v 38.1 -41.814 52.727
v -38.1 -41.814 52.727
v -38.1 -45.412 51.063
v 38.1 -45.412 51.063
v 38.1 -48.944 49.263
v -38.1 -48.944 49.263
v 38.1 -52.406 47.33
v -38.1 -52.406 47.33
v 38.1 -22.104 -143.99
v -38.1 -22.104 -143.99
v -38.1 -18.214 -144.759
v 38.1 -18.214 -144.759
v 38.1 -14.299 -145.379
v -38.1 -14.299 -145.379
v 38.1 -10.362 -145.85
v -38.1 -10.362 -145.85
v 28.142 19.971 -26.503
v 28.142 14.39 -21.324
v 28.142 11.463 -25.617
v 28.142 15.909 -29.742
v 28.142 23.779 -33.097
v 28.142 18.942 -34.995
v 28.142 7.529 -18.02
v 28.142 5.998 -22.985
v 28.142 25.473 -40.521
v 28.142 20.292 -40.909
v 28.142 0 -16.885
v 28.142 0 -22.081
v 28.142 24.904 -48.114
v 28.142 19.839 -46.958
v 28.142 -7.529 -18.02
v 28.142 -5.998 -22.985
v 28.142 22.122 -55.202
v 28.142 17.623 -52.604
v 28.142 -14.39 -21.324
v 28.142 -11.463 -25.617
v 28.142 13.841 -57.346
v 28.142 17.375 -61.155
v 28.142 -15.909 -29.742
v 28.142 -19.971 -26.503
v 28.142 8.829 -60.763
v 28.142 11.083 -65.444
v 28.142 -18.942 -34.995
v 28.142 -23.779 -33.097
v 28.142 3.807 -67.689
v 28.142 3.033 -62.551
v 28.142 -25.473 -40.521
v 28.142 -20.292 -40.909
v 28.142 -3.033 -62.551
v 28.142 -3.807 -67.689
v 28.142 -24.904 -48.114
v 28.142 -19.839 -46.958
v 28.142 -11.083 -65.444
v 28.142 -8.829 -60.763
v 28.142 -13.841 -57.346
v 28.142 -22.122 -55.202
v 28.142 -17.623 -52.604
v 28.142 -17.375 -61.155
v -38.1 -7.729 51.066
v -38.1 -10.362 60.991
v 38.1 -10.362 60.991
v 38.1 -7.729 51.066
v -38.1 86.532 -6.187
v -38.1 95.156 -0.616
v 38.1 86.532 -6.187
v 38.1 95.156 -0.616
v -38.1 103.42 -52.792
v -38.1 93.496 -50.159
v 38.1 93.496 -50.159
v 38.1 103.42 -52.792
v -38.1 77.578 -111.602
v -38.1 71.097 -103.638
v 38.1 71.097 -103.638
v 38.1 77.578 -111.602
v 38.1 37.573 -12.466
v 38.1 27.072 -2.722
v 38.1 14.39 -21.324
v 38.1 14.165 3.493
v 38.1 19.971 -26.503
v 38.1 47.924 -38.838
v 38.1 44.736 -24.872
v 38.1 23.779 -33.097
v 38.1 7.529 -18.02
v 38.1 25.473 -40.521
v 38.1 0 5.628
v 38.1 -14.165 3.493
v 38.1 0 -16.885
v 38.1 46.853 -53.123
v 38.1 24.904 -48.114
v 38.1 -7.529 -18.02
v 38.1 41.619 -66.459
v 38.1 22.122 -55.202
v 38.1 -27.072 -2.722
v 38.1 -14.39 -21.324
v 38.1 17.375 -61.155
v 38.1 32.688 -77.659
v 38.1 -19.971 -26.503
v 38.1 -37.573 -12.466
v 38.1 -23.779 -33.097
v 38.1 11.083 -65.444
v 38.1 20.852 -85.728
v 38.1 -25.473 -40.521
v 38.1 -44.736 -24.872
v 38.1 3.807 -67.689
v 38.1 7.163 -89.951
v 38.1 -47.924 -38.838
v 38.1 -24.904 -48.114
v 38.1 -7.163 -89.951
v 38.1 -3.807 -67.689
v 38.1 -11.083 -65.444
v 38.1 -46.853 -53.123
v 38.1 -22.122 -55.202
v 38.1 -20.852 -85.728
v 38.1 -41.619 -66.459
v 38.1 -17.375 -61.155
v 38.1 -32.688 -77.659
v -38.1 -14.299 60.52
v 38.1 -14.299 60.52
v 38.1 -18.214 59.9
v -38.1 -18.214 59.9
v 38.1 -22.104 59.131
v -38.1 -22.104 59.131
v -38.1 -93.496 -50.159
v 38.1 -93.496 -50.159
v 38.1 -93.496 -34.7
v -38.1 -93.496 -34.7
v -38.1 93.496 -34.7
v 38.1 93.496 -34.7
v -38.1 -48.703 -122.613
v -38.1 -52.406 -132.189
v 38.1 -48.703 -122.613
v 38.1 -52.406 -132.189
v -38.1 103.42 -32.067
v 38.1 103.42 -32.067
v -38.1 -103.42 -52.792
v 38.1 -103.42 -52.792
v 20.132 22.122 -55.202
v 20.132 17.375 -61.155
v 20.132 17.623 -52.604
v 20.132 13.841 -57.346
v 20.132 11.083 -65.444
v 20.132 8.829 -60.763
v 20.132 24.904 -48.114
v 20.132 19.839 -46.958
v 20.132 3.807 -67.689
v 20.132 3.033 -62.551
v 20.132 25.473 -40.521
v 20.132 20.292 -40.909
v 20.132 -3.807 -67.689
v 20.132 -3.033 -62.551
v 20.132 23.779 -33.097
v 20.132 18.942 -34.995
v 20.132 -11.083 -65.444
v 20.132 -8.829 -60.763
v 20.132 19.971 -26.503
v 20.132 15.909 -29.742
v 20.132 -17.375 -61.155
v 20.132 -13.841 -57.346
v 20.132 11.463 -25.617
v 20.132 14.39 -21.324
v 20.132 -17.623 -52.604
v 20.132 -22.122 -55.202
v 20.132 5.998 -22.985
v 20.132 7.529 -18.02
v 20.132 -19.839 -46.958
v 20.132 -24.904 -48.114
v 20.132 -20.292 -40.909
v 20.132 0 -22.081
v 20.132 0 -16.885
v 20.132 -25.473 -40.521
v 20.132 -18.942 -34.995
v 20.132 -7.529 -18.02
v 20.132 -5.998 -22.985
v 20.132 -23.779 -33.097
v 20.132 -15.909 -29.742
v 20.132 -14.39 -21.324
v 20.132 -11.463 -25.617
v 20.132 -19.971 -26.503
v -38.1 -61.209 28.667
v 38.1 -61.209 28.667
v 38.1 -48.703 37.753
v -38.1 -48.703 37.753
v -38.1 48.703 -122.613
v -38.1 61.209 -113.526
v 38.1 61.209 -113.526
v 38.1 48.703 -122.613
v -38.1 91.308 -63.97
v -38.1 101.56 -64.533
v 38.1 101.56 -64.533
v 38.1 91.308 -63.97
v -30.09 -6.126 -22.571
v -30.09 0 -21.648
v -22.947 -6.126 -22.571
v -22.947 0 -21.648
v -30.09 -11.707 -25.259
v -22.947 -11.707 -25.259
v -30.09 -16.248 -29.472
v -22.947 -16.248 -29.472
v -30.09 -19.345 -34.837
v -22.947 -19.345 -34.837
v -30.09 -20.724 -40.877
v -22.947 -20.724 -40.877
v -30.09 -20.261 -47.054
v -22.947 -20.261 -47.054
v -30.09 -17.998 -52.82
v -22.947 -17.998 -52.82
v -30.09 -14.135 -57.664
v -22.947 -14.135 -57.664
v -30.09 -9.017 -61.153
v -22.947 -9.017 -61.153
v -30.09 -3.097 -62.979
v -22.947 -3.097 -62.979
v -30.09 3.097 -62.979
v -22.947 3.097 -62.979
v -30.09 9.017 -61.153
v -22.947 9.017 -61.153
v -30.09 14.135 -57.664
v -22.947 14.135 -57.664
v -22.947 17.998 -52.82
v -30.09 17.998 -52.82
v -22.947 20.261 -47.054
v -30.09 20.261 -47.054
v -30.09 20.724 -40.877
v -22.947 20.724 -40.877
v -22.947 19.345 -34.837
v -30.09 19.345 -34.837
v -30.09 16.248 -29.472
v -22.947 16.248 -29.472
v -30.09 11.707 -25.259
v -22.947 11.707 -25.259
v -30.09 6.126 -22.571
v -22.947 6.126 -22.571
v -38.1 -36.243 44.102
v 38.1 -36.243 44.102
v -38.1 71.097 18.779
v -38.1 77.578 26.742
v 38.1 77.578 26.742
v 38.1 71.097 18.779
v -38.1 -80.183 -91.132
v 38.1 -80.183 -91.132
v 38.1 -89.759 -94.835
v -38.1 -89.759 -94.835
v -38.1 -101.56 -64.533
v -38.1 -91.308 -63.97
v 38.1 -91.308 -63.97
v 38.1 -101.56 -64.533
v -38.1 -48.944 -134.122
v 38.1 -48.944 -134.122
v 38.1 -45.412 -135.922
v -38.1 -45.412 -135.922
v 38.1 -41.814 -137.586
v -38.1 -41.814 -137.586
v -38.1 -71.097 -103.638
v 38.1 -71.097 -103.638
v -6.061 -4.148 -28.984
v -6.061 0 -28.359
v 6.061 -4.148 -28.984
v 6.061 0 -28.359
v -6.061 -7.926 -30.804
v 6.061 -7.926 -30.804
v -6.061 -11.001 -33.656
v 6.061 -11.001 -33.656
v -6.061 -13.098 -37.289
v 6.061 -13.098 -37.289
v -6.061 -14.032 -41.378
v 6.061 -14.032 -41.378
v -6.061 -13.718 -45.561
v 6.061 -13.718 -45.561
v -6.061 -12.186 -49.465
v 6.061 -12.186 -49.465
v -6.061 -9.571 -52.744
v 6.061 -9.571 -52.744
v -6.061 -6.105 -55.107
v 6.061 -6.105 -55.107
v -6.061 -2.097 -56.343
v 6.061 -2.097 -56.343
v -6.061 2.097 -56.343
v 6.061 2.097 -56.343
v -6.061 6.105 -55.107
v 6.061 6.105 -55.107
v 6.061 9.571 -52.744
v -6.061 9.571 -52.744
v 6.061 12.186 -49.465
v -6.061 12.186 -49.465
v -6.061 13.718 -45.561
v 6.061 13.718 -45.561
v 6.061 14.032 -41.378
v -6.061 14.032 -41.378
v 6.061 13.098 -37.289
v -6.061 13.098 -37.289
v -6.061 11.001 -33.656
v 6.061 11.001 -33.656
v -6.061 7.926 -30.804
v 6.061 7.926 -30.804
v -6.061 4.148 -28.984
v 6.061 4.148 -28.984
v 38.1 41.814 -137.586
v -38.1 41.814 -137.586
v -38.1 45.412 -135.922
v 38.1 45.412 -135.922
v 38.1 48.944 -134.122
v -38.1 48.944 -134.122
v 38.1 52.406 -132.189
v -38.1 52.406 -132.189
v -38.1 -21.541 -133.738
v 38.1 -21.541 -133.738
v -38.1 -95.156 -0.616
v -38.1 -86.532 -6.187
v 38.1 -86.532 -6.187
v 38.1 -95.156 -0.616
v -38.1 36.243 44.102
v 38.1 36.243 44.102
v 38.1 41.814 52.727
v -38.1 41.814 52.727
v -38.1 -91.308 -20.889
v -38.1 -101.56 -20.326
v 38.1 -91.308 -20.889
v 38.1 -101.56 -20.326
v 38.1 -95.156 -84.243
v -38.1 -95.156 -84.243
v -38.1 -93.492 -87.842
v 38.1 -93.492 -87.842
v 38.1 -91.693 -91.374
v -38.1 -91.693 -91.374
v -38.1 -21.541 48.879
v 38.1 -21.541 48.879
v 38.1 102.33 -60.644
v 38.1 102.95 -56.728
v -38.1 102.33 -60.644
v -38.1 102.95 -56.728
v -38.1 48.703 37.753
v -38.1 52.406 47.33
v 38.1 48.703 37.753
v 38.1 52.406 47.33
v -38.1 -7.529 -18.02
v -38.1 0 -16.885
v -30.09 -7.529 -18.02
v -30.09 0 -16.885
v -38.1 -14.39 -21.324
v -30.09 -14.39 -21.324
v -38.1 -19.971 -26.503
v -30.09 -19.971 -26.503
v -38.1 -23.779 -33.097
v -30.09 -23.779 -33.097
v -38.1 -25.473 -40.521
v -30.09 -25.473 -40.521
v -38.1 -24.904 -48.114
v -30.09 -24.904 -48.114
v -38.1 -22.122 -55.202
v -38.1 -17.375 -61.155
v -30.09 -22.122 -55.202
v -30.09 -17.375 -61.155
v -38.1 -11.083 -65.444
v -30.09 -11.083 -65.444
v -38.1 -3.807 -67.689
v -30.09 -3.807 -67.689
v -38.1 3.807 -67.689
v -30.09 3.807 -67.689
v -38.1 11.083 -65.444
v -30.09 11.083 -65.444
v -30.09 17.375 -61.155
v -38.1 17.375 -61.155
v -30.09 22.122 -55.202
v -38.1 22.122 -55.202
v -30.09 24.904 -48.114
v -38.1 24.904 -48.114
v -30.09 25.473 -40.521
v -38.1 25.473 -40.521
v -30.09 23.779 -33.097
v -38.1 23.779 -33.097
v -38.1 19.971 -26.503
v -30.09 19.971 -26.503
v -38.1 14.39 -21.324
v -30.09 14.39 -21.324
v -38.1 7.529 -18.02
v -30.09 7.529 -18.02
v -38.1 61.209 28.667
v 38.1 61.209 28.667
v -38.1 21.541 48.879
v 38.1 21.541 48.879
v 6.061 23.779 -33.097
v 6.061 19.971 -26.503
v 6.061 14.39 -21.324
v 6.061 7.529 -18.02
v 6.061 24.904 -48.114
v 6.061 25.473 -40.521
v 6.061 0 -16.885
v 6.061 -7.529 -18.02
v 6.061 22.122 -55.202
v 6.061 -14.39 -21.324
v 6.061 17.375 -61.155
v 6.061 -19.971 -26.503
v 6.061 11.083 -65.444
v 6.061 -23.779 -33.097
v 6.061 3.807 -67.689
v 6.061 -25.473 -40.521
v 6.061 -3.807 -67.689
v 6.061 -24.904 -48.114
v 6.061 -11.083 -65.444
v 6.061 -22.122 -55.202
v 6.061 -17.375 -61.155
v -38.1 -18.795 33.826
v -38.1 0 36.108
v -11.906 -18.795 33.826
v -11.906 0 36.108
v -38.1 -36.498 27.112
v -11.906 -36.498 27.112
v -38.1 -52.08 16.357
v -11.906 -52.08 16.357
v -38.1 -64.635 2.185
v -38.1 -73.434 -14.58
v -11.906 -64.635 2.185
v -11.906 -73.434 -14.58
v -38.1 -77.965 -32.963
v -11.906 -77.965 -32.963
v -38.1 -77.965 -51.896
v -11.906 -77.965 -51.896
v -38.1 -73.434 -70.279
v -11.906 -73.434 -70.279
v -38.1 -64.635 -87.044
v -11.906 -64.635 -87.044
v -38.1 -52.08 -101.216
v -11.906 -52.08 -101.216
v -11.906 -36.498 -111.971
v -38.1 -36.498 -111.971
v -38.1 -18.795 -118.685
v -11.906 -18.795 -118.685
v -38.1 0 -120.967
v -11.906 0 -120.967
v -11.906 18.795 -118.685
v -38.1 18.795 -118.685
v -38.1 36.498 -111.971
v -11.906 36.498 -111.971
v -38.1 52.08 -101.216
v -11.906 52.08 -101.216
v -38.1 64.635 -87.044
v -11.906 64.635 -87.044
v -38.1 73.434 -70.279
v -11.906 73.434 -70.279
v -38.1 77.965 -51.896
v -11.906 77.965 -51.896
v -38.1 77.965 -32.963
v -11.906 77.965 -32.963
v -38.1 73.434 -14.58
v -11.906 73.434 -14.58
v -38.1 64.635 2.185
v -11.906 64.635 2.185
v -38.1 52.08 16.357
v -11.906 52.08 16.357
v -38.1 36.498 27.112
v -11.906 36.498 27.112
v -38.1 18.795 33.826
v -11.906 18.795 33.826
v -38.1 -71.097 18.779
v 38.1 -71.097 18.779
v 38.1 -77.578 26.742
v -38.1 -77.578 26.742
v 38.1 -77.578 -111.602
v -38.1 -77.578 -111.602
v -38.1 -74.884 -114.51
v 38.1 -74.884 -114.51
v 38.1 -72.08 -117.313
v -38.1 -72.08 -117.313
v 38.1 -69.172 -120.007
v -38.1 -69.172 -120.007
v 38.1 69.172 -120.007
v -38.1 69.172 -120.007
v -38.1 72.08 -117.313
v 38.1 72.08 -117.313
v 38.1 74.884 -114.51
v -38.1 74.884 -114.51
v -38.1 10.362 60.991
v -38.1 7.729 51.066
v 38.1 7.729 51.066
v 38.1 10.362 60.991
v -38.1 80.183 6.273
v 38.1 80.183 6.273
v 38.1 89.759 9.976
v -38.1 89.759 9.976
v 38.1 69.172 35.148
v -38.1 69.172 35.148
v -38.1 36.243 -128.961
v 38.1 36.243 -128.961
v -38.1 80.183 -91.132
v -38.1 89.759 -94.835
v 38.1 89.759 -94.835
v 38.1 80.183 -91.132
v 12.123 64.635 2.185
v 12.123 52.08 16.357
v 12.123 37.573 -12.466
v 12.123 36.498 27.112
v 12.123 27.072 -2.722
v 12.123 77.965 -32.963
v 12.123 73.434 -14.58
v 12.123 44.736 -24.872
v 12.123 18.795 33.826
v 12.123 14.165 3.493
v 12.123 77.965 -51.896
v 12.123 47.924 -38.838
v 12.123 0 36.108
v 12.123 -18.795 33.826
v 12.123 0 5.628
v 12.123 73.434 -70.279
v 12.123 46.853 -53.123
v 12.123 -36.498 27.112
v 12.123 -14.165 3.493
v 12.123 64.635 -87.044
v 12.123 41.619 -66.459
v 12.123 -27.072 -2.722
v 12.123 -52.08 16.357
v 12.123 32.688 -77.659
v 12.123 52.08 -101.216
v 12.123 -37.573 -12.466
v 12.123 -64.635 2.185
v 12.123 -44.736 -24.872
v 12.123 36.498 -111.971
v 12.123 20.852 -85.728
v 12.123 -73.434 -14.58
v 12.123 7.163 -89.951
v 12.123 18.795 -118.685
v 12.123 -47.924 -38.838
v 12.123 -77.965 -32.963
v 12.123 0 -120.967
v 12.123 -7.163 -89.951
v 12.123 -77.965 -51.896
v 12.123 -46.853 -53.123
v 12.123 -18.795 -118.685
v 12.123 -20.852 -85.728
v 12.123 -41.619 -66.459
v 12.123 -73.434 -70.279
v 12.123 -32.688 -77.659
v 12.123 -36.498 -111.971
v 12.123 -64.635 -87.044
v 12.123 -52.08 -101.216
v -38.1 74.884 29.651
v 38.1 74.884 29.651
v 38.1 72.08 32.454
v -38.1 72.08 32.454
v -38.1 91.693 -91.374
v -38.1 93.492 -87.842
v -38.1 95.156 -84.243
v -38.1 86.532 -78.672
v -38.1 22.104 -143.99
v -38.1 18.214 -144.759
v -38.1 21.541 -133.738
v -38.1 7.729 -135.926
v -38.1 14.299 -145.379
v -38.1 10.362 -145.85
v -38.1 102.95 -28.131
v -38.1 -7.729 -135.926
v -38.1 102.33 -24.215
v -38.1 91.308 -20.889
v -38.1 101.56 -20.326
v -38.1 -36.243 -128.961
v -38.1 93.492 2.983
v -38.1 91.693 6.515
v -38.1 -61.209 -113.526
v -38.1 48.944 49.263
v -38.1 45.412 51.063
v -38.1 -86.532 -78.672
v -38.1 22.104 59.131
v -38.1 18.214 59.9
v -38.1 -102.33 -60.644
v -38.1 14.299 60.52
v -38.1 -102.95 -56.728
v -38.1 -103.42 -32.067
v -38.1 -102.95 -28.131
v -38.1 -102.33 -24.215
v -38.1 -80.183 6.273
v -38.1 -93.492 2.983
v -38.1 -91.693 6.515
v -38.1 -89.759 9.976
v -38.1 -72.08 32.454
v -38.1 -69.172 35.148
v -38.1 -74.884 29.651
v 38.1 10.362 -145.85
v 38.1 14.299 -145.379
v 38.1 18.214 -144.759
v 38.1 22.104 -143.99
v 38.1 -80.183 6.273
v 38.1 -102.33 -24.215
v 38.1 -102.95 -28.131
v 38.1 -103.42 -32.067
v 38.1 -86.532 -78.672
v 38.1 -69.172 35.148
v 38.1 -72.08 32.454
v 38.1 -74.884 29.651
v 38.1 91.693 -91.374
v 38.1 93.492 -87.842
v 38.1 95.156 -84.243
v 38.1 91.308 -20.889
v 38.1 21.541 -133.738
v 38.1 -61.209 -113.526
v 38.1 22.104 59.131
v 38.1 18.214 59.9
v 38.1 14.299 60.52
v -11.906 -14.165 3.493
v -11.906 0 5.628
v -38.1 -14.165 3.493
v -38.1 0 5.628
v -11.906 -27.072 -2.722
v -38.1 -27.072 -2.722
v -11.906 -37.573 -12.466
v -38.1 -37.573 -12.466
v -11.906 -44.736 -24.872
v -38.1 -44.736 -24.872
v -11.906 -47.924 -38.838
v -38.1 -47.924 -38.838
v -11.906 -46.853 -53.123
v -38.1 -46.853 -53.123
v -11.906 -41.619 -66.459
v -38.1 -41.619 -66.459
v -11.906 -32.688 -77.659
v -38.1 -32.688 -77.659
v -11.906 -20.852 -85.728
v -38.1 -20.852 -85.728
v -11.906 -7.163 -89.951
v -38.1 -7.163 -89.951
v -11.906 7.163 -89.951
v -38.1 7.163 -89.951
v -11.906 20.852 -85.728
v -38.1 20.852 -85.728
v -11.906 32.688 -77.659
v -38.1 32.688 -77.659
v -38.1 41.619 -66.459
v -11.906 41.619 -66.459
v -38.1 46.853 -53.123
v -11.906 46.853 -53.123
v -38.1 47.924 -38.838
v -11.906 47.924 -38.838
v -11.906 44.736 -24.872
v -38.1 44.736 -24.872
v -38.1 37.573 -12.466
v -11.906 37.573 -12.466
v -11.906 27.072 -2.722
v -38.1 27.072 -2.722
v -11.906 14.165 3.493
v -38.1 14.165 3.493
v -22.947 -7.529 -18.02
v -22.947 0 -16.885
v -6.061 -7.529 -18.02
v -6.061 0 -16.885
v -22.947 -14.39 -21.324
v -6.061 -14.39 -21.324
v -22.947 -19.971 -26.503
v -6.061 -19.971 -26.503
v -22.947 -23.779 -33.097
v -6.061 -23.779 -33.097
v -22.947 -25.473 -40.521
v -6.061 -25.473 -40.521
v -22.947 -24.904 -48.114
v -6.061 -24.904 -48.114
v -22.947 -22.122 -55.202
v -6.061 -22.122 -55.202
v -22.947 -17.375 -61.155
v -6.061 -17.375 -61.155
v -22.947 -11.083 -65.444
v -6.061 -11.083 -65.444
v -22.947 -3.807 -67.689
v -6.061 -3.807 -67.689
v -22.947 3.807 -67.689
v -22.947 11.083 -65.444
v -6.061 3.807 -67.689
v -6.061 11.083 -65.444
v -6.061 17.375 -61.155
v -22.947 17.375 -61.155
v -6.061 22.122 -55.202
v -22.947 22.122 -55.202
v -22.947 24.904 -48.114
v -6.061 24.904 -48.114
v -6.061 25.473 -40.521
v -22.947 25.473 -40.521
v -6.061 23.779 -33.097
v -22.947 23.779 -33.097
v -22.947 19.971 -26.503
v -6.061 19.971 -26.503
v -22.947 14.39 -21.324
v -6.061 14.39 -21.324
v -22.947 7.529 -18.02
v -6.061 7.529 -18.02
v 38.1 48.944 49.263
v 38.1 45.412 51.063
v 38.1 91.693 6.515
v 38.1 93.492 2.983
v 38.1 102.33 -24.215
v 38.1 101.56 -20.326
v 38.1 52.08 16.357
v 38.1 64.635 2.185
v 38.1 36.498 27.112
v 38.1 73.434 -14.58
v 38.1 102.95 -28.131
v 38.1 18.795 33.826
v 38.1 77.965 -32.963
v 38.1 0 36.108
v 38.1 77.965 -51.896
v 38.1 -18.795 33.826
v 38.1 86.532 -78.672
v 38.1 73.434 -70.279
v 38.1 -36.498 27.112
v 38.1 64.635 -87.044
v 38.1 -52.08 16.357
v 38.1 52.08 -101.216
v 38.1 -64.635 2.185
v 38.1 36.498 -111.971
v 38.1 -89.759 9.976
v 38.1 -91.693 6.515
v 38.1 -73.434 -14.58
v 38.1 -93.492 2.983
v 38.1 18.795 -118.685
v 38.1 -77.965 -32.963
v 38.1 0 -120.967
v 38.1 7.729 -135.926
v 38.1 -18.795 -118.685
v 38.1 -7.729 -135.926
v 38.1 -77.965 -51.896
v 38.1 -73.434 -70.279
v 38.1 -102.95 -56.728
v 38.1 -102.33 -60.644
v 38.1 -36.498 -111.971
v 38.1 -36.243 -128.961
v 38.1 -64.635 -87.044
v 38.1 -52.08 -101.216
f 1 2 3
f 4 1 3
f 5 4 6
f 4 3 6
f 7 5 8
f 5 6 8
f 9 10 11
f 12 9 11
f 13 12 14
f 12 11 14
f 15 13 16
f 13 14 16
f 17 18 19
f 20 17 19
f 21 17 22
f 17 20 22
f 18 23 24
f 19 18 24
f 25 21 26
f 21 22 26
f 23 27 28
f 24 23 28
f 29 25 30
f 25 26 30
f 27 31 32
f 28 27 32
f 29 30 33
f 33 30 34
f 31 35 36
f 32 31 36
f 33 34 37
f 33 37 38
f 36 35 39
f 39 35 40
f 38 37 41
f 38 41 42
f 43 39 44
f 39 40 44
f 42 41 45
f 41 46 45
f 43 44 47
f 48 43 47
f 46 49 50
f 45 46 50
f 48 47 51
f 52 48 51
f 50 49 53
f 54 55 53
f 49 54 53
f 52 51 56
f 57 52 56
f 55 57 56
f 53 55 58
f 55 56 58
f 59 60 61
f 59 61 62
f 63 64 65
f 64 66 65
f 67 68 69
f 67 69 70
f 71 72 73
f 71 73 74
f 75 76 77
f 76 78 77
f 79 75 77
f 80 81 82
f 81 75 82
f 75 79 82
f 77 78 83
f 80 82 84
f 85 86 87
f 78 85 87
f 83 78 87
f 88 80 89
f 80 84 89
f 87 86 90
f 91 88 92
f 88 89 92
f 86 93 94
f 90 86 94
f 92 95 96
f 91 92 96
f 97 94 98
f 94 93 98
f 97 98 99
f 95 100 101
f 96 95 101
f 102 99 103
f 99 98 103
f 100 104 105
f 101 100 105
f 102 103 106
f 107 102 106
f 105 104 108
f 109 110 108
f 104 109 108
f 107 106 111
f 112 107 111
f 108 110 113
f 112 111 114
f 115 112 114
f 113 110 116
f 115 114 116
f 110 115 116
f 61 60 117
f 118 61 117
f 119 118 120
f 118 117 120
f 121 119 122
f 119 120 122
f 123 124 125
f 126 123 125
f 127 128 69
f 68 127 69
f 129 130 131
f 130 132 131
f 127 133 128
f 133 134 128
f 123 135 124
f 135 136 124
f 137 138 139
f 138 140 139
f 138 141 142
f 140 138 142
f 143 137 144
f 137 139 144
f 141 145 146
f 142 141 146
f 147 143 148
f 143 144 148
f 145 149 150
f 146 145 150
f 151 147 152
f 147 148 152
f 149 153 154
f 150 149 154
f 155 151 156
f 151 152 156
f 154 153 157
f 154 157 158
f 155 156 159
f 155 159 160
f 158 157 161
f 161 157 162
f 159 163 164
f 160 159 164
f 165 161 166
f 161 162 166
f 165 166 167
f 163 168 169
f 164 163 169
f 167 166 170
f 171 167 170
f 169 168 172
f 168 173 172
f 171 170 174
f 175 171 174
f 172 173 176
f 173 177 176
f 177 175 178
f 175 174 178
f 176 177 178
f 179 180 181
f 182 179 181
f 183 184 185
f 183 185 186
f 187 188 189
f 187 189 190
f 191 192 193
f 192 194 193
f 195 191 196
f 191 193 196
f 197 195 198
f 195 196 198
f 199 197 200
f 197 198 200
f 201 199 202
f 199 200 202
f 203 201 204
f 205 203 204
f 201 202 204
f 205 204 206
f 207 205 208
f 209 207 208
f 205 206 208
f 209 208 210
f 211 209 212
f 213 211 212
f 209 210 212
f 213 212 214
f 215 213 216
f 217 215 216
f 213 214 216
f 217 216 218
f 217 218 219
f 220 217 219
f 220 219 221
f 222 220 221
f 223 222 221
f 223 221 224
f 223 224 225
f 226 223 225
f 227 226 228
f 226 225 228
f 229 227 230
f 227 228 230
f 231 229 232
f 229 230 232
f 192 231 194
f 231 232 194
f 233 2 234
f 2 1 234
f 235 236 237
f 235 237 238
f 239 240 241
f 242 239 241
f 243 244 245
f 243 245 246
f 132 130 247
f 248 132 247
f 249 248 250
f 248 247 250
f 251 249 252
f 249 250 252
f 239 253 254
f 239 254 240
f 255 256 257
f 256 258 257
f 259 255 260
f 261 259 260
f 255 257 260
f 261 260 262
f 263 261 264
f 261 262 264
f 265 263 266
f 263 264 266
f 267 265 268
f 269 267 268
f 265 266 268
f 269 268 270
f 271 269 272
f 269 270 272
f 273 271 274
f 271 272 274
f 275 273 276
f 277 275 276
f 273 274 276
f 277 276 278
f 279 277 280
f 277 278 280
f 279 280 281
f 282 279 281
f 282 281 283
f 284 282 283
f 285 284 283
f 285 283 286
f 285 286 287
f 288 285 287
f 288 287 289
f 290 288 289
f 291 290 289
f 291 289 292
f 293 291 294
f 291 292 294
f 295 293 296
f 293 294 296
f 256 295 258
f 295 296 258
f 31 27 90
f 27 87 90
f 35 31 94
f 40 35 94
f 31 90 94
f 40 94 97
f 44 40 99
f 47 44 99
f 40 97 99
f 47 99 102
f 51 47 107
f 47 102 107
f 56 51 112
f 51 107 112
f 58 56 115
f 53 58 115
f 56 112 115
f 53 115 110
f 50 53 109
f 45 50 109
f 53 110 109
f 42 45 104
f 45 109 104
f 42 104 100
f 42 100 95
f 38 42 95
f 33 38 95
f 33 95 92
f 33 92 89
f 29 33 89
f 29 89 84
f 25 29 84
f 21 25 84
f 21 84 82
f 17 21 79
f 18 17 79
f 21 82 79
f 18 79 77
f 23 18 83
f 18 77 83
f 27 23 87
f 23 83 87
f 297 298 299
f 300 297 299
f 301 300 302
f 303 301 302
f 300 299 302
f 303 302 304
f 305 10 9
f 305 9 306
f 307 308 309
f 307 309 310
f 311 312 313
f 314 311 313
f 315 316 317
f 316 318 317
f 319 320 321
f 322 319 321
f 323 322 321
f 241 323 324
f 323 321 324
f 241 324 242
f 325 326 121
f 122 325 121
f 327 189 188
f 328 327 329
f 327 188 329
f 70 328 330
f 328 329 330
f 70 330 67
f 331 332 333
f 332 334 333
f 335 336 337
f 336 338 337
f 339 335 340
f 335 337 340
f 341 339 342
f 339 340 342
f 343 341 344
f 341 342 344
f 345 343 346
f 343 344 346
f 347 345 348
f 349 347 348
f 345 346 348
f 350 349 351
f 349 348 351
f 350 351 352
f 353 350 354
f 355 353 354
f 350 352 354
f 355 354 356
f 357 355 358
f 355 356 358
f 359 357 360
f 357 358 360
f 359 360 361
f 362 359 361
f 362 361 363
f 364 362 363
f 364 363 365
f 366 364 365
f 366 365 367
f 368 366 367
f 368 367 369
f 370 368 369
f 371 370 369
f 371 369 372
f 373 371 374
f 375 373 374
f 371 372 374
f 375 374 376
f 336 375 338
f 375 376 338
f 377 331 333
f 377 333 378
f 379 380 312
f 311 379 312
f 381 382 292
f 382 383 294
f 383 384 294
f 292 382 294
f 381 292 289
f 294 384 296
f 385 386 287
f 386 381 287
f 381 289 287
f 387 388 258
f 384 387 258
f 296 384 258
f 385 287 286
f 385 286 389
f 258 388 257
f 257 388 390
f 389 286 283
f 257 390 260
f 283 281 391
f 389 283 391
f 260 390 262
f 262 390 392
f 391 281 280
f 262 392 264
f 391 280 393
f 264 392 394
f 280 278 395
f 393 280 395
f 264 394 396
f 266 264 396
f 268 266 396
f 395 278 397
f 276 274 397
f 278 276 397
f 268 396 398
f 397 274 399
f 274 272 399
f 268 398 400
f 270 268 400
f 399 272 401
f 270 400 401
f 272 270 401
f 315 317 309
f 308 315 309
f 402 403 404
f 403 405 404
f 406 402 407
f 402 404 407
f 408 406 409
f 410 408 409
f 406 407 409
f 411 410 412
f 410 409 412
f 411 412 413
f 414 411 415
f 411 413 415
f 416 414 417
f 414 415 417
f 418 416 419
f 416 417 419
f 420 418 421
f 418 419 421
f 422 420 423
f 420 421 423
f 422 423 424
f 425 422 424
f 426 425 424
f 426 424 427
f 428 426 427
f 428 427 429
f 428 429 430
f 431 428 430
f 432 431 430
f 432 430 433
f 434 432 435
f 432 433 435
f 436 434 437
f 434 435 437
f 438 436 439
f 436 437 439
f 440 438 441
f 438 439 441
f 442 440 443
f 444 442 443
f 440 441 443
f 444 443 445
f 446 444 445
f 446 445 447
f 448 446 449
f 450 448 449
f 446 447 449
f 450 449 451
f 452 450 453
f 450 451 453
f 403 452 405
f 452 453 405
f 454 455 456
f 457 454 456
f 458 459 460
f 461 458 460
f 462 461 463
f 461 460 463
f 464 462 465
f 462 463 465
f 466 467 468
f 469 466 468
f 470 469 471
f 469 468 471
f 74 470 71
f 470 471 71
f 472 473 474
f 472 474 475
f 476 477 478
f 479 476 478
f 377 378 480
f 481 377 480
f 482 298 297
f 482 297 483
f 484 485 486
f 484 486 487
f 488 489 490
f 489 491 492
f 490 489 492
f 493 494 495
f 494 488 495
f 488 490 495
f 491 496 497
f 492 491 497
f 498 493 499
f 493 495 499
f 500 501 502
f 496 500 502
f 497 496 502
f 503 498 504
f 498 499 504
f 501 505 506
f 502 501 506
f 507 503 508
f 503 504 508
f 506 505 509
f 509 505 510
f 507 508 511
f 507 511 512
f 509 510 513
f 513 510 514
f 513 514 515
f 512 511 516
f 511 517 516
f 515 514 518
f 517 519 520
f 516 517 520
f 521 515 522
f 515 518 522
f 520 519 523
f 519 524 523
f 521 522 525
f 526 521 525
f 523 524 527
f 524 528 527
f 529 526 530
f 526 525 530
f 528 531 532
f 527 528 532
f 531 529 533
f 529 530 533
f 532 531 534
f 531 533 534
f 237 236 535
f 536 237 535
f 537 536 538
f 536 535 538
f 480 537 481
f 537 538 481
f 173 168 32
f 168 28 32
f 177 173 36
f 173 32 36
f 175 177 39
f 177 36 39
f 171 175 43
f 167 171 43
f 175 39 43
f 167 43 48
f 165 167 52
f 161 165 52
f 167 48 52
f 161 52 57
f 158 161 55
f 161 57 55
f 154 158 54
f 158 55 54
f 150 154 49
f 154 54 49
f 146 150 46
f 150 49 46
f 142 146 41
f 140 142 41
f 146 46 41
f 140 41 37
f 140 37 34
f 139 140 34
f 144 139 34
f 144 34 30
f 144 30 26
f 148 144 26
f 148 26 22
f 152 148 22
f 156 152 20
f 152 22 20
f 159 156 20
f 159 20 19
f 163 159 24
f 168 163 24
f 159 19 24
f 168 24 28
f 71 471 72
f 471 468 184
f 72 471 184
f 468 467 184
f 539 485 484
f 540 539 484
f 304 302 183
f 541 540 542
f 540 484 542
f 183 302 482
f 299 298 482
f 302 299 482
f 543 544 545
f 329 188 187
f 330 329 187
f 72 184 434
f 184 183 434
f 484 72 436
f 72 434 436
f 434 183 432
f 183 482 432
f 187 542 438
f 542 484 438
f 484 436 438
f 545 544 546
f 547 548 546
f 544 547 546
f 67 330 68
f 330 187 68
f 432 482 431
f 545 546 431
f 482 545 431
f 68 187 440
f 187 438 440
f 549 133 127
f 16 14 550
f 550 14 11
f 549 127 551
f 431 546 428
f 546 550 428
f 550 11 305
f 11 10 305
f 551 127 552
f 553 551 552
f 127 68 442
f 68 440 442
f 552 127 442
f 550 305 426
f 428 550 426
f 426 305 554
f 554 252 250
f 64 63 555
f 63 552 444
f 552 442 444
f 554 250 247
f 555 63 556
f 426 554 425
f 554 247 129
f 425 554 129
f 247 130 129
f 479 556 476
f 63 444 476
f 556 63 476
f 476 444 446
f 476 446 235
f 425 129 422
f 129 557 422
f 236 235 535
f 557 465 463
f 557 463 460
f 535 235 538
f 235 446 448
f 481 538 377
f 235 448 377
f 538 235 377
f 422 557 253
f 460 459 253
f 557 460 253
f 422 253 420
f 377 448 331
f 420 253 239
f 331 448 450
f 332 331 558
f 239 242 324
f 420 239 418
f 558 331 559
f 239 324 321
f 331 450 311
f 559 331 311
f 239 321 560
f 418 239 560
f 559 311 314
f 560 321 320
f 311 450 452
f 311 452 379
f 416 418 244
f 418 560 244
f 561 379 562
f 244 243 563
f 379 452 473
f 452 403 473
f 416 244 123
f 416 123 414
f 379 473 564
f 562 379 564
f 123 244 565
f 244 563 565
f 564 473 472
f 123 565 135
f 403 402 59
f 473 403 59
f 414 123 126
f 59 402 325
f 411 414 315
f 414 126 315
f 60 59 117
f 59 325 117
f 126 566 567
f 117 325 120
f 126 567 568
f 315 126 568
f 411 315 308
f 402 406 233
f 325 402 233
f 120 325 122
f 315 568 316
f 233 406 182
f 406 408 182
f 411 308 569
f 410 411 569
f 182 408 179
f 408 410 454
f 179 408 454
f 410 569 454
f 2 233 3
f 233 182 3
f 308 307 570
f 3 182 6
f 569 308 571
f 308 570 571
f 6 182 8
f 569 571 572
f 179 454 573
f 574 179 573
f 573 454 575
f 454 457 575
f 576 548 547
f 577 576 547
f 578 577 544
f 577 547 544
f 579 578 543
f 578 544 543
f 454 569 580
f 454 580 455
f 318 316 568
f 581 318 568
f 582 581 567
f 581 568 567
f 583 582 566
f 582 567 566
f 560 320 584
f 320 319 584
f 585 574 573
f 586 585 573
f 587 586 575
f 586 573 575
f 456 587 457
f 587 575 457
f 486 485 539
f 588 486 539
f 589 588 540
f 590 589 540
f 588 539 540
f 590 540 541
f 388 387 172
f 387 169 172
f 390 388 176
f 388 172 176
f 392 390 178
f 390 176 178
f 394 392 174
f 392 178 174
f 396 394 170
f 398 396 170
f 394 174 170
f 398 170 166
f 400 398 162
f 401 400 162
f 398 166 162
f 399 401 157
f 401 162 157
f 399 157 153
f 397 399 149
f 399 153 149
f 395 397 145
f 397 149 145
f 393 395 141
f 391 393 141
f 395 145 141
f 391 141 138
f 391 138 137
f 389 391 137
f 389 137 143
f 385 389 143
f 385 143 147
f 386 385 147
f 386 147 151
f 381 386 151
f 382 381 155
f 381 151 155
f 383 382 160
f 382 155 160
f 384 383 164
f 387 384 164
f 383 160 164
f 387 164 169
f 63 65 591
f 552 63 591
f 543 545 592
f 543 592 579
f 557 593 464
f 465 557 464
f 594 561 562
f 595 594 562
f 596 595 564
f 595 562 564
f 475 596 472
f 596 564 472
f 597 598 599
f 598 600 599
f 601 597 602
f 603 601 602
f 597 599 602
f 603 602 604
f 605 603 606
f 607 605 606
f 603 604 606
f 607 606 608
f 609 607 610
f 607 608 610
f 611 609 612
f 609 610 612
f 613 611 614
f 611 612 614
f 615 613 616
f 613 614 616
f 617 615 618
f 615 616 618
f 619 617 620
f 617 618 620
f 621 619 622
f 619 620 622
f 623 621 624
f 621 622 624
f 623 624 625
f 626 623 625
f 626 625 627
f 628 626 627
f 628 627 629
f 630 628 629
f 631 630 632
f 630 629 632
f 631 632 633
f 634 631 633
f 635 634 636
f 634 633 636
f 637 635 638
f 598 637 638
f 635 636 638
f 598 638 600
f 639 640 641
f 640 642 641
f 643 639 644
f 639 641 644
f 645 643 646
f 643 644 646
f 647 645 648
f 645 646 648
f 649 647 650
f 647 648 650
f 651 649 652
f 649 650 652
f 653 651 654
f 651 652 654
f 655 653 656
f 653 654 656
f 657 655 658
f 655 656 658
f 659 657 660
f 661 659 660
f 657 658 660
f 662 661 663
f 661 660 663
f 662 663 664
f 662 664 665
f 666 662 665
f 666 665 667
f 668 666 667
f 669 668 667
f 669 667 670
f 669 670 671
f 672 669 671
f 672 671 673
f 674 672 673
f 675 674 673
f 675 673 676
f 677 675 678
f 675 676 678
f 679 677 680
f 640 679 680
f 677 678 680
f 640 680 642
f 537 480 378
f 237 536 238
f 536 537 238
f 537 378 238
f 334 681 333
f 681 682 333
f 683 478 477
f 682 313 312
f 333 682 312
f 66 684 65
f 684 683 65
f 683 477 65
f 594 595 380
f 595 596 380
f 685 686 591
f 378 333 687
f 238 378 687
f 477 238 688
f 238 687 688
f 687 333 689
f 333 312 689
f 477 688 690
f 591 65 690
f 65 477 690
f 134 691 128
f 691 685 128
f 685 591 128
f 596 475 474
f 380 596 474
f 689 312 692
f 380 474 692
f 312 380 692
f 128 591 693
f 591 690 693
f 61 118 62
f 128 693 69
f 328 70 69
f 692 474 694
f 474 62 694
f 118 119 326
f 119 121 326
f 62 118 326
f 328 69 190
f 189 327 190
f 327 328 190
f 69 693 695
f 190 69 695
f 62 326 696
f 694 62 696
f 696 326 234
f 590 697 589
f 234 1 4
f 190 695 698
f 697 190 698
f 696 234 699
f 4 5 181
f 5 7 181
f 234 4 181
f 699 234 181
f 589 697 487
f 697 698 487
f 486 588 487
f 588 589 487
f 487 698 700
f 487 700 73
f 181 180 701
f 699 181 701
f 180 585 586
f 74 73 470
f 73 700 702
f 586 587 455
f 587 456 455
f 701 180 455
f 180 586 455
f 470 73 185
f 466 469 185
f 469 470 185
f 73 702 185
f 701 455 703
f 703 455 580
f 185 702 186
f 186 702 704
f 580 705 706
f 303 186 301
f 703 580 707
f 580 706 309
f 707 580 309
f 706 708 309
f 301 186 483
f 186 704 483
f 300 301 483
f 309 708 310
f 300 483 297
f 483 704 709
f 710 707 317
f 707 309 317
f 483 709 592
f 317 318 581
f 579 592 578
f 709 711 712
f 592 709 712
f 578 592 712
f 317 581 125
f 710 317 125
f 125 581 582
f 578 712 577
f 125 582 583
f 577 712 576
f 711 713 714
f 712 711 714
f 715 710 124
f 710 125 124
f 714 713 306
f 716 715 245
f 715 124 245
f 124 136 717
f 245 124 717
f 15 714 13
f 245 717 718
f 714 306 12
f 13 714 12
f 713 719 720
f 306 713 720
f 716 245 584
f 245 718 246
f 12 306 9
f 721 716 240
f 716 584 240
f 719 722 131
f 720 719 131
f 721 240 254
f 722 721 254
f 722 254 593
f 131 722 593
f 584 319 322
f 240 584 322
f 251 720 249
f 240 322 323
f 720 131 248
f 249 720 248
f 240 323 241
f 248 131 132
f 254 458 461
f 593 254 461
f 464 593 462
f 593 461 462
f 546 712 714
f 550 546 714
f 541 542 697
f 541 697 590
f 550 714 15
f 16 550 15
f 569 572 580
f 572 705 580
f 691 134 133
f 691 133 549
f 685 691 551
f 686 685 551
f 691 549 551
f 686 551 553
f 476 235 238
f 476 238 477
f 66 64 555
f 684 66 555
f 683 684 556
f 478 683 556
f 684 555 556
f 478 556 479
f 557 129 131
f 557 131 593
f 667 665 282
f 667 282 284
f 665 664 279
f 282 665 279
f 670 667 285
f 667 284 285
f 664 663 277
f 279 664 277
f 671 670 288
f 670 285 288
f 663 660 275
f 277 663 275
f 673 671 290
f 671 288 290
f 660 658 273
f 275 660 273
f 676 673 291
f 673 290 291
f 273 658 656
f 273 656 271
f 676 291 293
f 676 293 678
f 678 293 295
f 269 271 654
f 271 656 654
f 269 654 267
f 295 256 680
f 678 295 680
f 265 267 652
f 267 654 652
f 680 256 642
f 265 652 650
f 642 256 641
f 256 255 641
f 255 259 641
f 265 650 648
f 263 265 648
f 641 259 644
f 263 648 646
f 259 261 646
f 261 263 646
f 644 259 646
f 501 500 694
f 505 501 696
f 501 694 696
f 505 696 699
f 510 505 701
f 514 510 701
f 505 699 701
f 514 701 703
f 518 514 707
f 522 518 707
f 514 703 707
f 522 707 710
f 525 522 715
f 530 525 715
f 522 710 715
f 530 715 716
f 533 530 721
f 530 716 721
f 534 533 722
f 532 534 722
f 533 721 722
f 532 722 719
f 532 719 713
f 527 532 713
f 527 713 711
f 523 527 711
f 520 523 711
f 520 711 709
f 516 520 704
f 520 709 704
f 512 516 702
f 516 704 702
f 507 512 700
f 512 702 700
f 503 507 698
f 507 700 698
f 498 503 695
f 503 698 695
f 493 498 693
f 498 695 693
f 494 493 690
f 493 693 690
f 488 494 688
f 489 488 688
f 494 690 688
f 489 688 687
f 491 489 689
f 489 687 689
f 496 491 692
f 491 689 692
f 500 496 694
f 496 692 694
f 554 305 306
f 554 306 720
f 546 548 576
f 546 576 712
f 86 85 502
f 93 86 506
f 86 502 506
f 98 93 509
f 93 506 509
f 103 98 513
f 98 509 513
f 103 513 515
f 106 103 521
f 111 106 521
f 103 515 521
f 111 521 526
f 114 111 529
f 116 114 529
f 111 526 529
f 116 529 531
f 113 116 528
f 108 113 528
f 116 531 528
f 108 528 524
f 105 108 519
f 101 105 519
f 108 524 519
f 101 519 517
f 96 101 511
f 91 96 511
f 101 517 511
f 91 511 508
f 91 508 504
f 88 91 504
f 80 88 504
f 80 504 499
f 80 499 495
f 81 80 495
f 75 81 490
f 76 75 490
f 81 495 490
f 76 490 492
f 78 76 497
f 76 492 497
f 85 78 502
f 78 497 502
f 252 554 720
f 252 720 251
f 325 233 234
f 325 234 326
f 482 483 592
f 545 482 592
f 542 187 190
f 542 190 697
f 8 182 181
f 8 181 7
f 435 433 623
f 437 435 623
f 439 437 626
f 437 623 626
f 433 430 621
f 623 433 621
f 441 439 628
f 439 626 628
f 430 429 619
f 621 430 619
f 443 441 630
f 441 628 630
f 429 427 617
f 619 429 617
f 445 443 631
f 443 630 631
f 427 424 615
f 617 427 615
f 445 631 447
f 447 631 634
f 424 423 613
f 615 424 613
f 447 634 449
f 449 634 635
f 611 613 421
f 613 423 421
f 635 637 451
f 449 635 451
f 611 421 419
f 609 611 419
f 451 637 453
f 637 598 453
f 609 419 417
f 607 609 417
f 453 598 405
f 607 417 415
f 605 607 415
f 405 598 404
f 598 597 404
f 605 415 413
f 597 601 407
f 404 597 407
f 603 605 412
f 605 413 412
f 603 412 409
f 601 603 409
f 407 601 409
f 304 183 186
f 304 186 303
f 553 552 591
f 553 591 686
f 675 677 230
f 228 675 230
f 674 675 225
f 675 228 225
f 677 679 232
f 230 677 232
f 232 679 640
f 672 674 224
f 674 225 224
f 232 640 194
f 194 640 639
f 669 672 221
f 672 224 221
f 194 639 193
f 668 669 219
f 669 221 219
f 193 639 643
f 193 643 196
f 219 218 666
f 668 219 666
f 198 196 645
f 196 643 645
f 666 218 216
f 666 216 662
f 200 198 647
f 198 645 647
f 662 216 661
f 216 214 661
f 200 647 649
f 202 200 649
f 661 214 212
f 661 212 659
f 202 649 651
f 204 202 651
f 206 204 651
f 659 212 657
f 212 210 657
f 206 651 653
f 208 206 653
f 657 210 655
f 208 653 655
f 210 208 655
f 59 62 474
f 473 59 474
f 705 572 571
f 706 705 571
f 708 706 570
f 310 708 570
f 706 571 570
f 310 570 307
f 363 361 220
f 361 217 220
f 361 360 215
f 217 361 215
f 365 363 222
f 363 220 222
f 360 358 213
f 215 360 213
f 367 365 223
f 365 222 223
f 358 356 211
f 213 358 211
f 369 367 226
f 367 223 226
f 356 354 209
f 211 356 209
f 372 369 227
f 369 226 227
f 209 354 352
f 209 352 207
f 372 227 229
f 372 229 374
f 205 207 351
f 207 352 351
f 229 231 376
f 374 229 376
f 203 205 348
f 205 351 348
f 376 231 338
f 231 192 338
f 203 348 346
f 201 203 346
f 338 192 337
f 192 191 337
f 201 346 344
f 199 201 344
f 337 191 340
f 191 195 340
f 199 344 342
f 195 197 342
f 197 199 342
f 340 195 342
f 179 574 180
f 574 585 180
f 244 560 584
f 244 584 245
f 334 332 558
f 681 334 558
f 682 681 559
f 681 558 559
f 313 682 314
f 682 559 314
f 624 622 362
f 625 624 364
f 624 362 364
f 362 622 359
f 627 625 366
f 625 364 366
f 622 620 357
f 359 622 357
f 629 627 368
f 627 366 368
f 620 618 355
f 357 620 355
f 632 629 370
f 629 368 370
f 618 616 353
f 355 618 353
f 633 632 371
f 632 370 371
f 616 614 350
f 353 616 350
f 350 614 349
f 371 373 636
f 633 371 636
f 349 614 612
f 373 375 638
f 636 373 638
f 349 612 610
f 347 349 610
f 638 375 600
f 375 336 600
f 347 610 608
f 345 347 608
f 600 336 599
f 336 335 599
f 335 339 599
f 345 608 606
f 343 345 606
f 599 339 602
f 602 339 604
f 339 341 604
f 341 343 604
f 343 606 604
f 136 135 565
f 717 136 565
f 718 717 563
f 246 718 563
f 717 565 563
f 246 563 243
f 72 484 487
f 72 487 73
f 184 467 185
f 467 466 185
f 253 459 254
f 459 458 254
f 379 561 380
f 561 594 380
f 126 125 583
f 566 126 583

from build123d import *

# Parameters (mm, degrees)
F3_DEPTH        = 88.646
F3_COPIES_COUNT = 20


# Not quite as in the source:
# - a feature of the source that left no trace in its solid (it failed there, or was rolled back) is left out
# - a pattern or mirror of a feature is missing from the dataset's text; its kind, count and spacing are read off the source's solid


with BuildPart() as f1:
    # F0 (on Front) → F1 (revolve)
    with BuildSketch(Plane.XZ):
        Polygon((38.1, 36.1084090909), (38.1, 61.5084090909), (-38.1, 61.5084090909), (-38.1, 36.1084090909), (-11.9062505468, 36.1084090909), (-11.9062505468, 5.6284090909), (-38.1, 5.6284090909), (-38.1, -16.8852278195), (-30.0903403623, -16.8852278195), (-30.0903403623, -21.6477272727), (-22.9465920027, -21.6477272727), (-22.9465920027, -16.8852278195), (-6.0613630896, -16.8852278195), (-6.0613630896, -28.3585221805), (6.0613652768, -28.3585221805), (6.0613652768, -16.8852278195), (20.1323869104, -16.8852278195), (20.1323869104, -22.0806807246), (28.1420443609, -22.0806807246), (28.1420443609, -16.8852278195), (38.1, -16.8852278195), (38.1, 5.6284090909), (12.1227261791, 5.6284090909), (12.1227261791, 36.1084090909), align=None)
    revolve(axis=Axis((0.8659090909, 0, -42.4295432673), (1, 0, 0)))

    # F2 (on face) → F3 (cut, symmetric)
    with BuildSketch(Plane.YZ.offset(28.1420443609)):
        Polygon((0, 65.8745542169), (-11.6578890011, 65.8745542169), (-7.7292122878, 51.0664619505), (0, 51.0664619505), (7.7292122878, 51.0664619505), (11.6578890011, 65.8745542169), align=None)
    f3 = extrude(amount=F3_DEPTH, both=True, mode=Mode.SUBTRACT)

    # F3_copies: F3 ×20 about axis
    f3_copies_axis = Axis((0, 0, -42.429543), (1, 0, 0))
    for i in range(1, F3_COPIES_COUNT):
        add(f3.rotate(f3_copies_axis, i * 360 / F3_COPIES_COUNT), mode=Mode.SUBTRACT)


solid = f1.part
